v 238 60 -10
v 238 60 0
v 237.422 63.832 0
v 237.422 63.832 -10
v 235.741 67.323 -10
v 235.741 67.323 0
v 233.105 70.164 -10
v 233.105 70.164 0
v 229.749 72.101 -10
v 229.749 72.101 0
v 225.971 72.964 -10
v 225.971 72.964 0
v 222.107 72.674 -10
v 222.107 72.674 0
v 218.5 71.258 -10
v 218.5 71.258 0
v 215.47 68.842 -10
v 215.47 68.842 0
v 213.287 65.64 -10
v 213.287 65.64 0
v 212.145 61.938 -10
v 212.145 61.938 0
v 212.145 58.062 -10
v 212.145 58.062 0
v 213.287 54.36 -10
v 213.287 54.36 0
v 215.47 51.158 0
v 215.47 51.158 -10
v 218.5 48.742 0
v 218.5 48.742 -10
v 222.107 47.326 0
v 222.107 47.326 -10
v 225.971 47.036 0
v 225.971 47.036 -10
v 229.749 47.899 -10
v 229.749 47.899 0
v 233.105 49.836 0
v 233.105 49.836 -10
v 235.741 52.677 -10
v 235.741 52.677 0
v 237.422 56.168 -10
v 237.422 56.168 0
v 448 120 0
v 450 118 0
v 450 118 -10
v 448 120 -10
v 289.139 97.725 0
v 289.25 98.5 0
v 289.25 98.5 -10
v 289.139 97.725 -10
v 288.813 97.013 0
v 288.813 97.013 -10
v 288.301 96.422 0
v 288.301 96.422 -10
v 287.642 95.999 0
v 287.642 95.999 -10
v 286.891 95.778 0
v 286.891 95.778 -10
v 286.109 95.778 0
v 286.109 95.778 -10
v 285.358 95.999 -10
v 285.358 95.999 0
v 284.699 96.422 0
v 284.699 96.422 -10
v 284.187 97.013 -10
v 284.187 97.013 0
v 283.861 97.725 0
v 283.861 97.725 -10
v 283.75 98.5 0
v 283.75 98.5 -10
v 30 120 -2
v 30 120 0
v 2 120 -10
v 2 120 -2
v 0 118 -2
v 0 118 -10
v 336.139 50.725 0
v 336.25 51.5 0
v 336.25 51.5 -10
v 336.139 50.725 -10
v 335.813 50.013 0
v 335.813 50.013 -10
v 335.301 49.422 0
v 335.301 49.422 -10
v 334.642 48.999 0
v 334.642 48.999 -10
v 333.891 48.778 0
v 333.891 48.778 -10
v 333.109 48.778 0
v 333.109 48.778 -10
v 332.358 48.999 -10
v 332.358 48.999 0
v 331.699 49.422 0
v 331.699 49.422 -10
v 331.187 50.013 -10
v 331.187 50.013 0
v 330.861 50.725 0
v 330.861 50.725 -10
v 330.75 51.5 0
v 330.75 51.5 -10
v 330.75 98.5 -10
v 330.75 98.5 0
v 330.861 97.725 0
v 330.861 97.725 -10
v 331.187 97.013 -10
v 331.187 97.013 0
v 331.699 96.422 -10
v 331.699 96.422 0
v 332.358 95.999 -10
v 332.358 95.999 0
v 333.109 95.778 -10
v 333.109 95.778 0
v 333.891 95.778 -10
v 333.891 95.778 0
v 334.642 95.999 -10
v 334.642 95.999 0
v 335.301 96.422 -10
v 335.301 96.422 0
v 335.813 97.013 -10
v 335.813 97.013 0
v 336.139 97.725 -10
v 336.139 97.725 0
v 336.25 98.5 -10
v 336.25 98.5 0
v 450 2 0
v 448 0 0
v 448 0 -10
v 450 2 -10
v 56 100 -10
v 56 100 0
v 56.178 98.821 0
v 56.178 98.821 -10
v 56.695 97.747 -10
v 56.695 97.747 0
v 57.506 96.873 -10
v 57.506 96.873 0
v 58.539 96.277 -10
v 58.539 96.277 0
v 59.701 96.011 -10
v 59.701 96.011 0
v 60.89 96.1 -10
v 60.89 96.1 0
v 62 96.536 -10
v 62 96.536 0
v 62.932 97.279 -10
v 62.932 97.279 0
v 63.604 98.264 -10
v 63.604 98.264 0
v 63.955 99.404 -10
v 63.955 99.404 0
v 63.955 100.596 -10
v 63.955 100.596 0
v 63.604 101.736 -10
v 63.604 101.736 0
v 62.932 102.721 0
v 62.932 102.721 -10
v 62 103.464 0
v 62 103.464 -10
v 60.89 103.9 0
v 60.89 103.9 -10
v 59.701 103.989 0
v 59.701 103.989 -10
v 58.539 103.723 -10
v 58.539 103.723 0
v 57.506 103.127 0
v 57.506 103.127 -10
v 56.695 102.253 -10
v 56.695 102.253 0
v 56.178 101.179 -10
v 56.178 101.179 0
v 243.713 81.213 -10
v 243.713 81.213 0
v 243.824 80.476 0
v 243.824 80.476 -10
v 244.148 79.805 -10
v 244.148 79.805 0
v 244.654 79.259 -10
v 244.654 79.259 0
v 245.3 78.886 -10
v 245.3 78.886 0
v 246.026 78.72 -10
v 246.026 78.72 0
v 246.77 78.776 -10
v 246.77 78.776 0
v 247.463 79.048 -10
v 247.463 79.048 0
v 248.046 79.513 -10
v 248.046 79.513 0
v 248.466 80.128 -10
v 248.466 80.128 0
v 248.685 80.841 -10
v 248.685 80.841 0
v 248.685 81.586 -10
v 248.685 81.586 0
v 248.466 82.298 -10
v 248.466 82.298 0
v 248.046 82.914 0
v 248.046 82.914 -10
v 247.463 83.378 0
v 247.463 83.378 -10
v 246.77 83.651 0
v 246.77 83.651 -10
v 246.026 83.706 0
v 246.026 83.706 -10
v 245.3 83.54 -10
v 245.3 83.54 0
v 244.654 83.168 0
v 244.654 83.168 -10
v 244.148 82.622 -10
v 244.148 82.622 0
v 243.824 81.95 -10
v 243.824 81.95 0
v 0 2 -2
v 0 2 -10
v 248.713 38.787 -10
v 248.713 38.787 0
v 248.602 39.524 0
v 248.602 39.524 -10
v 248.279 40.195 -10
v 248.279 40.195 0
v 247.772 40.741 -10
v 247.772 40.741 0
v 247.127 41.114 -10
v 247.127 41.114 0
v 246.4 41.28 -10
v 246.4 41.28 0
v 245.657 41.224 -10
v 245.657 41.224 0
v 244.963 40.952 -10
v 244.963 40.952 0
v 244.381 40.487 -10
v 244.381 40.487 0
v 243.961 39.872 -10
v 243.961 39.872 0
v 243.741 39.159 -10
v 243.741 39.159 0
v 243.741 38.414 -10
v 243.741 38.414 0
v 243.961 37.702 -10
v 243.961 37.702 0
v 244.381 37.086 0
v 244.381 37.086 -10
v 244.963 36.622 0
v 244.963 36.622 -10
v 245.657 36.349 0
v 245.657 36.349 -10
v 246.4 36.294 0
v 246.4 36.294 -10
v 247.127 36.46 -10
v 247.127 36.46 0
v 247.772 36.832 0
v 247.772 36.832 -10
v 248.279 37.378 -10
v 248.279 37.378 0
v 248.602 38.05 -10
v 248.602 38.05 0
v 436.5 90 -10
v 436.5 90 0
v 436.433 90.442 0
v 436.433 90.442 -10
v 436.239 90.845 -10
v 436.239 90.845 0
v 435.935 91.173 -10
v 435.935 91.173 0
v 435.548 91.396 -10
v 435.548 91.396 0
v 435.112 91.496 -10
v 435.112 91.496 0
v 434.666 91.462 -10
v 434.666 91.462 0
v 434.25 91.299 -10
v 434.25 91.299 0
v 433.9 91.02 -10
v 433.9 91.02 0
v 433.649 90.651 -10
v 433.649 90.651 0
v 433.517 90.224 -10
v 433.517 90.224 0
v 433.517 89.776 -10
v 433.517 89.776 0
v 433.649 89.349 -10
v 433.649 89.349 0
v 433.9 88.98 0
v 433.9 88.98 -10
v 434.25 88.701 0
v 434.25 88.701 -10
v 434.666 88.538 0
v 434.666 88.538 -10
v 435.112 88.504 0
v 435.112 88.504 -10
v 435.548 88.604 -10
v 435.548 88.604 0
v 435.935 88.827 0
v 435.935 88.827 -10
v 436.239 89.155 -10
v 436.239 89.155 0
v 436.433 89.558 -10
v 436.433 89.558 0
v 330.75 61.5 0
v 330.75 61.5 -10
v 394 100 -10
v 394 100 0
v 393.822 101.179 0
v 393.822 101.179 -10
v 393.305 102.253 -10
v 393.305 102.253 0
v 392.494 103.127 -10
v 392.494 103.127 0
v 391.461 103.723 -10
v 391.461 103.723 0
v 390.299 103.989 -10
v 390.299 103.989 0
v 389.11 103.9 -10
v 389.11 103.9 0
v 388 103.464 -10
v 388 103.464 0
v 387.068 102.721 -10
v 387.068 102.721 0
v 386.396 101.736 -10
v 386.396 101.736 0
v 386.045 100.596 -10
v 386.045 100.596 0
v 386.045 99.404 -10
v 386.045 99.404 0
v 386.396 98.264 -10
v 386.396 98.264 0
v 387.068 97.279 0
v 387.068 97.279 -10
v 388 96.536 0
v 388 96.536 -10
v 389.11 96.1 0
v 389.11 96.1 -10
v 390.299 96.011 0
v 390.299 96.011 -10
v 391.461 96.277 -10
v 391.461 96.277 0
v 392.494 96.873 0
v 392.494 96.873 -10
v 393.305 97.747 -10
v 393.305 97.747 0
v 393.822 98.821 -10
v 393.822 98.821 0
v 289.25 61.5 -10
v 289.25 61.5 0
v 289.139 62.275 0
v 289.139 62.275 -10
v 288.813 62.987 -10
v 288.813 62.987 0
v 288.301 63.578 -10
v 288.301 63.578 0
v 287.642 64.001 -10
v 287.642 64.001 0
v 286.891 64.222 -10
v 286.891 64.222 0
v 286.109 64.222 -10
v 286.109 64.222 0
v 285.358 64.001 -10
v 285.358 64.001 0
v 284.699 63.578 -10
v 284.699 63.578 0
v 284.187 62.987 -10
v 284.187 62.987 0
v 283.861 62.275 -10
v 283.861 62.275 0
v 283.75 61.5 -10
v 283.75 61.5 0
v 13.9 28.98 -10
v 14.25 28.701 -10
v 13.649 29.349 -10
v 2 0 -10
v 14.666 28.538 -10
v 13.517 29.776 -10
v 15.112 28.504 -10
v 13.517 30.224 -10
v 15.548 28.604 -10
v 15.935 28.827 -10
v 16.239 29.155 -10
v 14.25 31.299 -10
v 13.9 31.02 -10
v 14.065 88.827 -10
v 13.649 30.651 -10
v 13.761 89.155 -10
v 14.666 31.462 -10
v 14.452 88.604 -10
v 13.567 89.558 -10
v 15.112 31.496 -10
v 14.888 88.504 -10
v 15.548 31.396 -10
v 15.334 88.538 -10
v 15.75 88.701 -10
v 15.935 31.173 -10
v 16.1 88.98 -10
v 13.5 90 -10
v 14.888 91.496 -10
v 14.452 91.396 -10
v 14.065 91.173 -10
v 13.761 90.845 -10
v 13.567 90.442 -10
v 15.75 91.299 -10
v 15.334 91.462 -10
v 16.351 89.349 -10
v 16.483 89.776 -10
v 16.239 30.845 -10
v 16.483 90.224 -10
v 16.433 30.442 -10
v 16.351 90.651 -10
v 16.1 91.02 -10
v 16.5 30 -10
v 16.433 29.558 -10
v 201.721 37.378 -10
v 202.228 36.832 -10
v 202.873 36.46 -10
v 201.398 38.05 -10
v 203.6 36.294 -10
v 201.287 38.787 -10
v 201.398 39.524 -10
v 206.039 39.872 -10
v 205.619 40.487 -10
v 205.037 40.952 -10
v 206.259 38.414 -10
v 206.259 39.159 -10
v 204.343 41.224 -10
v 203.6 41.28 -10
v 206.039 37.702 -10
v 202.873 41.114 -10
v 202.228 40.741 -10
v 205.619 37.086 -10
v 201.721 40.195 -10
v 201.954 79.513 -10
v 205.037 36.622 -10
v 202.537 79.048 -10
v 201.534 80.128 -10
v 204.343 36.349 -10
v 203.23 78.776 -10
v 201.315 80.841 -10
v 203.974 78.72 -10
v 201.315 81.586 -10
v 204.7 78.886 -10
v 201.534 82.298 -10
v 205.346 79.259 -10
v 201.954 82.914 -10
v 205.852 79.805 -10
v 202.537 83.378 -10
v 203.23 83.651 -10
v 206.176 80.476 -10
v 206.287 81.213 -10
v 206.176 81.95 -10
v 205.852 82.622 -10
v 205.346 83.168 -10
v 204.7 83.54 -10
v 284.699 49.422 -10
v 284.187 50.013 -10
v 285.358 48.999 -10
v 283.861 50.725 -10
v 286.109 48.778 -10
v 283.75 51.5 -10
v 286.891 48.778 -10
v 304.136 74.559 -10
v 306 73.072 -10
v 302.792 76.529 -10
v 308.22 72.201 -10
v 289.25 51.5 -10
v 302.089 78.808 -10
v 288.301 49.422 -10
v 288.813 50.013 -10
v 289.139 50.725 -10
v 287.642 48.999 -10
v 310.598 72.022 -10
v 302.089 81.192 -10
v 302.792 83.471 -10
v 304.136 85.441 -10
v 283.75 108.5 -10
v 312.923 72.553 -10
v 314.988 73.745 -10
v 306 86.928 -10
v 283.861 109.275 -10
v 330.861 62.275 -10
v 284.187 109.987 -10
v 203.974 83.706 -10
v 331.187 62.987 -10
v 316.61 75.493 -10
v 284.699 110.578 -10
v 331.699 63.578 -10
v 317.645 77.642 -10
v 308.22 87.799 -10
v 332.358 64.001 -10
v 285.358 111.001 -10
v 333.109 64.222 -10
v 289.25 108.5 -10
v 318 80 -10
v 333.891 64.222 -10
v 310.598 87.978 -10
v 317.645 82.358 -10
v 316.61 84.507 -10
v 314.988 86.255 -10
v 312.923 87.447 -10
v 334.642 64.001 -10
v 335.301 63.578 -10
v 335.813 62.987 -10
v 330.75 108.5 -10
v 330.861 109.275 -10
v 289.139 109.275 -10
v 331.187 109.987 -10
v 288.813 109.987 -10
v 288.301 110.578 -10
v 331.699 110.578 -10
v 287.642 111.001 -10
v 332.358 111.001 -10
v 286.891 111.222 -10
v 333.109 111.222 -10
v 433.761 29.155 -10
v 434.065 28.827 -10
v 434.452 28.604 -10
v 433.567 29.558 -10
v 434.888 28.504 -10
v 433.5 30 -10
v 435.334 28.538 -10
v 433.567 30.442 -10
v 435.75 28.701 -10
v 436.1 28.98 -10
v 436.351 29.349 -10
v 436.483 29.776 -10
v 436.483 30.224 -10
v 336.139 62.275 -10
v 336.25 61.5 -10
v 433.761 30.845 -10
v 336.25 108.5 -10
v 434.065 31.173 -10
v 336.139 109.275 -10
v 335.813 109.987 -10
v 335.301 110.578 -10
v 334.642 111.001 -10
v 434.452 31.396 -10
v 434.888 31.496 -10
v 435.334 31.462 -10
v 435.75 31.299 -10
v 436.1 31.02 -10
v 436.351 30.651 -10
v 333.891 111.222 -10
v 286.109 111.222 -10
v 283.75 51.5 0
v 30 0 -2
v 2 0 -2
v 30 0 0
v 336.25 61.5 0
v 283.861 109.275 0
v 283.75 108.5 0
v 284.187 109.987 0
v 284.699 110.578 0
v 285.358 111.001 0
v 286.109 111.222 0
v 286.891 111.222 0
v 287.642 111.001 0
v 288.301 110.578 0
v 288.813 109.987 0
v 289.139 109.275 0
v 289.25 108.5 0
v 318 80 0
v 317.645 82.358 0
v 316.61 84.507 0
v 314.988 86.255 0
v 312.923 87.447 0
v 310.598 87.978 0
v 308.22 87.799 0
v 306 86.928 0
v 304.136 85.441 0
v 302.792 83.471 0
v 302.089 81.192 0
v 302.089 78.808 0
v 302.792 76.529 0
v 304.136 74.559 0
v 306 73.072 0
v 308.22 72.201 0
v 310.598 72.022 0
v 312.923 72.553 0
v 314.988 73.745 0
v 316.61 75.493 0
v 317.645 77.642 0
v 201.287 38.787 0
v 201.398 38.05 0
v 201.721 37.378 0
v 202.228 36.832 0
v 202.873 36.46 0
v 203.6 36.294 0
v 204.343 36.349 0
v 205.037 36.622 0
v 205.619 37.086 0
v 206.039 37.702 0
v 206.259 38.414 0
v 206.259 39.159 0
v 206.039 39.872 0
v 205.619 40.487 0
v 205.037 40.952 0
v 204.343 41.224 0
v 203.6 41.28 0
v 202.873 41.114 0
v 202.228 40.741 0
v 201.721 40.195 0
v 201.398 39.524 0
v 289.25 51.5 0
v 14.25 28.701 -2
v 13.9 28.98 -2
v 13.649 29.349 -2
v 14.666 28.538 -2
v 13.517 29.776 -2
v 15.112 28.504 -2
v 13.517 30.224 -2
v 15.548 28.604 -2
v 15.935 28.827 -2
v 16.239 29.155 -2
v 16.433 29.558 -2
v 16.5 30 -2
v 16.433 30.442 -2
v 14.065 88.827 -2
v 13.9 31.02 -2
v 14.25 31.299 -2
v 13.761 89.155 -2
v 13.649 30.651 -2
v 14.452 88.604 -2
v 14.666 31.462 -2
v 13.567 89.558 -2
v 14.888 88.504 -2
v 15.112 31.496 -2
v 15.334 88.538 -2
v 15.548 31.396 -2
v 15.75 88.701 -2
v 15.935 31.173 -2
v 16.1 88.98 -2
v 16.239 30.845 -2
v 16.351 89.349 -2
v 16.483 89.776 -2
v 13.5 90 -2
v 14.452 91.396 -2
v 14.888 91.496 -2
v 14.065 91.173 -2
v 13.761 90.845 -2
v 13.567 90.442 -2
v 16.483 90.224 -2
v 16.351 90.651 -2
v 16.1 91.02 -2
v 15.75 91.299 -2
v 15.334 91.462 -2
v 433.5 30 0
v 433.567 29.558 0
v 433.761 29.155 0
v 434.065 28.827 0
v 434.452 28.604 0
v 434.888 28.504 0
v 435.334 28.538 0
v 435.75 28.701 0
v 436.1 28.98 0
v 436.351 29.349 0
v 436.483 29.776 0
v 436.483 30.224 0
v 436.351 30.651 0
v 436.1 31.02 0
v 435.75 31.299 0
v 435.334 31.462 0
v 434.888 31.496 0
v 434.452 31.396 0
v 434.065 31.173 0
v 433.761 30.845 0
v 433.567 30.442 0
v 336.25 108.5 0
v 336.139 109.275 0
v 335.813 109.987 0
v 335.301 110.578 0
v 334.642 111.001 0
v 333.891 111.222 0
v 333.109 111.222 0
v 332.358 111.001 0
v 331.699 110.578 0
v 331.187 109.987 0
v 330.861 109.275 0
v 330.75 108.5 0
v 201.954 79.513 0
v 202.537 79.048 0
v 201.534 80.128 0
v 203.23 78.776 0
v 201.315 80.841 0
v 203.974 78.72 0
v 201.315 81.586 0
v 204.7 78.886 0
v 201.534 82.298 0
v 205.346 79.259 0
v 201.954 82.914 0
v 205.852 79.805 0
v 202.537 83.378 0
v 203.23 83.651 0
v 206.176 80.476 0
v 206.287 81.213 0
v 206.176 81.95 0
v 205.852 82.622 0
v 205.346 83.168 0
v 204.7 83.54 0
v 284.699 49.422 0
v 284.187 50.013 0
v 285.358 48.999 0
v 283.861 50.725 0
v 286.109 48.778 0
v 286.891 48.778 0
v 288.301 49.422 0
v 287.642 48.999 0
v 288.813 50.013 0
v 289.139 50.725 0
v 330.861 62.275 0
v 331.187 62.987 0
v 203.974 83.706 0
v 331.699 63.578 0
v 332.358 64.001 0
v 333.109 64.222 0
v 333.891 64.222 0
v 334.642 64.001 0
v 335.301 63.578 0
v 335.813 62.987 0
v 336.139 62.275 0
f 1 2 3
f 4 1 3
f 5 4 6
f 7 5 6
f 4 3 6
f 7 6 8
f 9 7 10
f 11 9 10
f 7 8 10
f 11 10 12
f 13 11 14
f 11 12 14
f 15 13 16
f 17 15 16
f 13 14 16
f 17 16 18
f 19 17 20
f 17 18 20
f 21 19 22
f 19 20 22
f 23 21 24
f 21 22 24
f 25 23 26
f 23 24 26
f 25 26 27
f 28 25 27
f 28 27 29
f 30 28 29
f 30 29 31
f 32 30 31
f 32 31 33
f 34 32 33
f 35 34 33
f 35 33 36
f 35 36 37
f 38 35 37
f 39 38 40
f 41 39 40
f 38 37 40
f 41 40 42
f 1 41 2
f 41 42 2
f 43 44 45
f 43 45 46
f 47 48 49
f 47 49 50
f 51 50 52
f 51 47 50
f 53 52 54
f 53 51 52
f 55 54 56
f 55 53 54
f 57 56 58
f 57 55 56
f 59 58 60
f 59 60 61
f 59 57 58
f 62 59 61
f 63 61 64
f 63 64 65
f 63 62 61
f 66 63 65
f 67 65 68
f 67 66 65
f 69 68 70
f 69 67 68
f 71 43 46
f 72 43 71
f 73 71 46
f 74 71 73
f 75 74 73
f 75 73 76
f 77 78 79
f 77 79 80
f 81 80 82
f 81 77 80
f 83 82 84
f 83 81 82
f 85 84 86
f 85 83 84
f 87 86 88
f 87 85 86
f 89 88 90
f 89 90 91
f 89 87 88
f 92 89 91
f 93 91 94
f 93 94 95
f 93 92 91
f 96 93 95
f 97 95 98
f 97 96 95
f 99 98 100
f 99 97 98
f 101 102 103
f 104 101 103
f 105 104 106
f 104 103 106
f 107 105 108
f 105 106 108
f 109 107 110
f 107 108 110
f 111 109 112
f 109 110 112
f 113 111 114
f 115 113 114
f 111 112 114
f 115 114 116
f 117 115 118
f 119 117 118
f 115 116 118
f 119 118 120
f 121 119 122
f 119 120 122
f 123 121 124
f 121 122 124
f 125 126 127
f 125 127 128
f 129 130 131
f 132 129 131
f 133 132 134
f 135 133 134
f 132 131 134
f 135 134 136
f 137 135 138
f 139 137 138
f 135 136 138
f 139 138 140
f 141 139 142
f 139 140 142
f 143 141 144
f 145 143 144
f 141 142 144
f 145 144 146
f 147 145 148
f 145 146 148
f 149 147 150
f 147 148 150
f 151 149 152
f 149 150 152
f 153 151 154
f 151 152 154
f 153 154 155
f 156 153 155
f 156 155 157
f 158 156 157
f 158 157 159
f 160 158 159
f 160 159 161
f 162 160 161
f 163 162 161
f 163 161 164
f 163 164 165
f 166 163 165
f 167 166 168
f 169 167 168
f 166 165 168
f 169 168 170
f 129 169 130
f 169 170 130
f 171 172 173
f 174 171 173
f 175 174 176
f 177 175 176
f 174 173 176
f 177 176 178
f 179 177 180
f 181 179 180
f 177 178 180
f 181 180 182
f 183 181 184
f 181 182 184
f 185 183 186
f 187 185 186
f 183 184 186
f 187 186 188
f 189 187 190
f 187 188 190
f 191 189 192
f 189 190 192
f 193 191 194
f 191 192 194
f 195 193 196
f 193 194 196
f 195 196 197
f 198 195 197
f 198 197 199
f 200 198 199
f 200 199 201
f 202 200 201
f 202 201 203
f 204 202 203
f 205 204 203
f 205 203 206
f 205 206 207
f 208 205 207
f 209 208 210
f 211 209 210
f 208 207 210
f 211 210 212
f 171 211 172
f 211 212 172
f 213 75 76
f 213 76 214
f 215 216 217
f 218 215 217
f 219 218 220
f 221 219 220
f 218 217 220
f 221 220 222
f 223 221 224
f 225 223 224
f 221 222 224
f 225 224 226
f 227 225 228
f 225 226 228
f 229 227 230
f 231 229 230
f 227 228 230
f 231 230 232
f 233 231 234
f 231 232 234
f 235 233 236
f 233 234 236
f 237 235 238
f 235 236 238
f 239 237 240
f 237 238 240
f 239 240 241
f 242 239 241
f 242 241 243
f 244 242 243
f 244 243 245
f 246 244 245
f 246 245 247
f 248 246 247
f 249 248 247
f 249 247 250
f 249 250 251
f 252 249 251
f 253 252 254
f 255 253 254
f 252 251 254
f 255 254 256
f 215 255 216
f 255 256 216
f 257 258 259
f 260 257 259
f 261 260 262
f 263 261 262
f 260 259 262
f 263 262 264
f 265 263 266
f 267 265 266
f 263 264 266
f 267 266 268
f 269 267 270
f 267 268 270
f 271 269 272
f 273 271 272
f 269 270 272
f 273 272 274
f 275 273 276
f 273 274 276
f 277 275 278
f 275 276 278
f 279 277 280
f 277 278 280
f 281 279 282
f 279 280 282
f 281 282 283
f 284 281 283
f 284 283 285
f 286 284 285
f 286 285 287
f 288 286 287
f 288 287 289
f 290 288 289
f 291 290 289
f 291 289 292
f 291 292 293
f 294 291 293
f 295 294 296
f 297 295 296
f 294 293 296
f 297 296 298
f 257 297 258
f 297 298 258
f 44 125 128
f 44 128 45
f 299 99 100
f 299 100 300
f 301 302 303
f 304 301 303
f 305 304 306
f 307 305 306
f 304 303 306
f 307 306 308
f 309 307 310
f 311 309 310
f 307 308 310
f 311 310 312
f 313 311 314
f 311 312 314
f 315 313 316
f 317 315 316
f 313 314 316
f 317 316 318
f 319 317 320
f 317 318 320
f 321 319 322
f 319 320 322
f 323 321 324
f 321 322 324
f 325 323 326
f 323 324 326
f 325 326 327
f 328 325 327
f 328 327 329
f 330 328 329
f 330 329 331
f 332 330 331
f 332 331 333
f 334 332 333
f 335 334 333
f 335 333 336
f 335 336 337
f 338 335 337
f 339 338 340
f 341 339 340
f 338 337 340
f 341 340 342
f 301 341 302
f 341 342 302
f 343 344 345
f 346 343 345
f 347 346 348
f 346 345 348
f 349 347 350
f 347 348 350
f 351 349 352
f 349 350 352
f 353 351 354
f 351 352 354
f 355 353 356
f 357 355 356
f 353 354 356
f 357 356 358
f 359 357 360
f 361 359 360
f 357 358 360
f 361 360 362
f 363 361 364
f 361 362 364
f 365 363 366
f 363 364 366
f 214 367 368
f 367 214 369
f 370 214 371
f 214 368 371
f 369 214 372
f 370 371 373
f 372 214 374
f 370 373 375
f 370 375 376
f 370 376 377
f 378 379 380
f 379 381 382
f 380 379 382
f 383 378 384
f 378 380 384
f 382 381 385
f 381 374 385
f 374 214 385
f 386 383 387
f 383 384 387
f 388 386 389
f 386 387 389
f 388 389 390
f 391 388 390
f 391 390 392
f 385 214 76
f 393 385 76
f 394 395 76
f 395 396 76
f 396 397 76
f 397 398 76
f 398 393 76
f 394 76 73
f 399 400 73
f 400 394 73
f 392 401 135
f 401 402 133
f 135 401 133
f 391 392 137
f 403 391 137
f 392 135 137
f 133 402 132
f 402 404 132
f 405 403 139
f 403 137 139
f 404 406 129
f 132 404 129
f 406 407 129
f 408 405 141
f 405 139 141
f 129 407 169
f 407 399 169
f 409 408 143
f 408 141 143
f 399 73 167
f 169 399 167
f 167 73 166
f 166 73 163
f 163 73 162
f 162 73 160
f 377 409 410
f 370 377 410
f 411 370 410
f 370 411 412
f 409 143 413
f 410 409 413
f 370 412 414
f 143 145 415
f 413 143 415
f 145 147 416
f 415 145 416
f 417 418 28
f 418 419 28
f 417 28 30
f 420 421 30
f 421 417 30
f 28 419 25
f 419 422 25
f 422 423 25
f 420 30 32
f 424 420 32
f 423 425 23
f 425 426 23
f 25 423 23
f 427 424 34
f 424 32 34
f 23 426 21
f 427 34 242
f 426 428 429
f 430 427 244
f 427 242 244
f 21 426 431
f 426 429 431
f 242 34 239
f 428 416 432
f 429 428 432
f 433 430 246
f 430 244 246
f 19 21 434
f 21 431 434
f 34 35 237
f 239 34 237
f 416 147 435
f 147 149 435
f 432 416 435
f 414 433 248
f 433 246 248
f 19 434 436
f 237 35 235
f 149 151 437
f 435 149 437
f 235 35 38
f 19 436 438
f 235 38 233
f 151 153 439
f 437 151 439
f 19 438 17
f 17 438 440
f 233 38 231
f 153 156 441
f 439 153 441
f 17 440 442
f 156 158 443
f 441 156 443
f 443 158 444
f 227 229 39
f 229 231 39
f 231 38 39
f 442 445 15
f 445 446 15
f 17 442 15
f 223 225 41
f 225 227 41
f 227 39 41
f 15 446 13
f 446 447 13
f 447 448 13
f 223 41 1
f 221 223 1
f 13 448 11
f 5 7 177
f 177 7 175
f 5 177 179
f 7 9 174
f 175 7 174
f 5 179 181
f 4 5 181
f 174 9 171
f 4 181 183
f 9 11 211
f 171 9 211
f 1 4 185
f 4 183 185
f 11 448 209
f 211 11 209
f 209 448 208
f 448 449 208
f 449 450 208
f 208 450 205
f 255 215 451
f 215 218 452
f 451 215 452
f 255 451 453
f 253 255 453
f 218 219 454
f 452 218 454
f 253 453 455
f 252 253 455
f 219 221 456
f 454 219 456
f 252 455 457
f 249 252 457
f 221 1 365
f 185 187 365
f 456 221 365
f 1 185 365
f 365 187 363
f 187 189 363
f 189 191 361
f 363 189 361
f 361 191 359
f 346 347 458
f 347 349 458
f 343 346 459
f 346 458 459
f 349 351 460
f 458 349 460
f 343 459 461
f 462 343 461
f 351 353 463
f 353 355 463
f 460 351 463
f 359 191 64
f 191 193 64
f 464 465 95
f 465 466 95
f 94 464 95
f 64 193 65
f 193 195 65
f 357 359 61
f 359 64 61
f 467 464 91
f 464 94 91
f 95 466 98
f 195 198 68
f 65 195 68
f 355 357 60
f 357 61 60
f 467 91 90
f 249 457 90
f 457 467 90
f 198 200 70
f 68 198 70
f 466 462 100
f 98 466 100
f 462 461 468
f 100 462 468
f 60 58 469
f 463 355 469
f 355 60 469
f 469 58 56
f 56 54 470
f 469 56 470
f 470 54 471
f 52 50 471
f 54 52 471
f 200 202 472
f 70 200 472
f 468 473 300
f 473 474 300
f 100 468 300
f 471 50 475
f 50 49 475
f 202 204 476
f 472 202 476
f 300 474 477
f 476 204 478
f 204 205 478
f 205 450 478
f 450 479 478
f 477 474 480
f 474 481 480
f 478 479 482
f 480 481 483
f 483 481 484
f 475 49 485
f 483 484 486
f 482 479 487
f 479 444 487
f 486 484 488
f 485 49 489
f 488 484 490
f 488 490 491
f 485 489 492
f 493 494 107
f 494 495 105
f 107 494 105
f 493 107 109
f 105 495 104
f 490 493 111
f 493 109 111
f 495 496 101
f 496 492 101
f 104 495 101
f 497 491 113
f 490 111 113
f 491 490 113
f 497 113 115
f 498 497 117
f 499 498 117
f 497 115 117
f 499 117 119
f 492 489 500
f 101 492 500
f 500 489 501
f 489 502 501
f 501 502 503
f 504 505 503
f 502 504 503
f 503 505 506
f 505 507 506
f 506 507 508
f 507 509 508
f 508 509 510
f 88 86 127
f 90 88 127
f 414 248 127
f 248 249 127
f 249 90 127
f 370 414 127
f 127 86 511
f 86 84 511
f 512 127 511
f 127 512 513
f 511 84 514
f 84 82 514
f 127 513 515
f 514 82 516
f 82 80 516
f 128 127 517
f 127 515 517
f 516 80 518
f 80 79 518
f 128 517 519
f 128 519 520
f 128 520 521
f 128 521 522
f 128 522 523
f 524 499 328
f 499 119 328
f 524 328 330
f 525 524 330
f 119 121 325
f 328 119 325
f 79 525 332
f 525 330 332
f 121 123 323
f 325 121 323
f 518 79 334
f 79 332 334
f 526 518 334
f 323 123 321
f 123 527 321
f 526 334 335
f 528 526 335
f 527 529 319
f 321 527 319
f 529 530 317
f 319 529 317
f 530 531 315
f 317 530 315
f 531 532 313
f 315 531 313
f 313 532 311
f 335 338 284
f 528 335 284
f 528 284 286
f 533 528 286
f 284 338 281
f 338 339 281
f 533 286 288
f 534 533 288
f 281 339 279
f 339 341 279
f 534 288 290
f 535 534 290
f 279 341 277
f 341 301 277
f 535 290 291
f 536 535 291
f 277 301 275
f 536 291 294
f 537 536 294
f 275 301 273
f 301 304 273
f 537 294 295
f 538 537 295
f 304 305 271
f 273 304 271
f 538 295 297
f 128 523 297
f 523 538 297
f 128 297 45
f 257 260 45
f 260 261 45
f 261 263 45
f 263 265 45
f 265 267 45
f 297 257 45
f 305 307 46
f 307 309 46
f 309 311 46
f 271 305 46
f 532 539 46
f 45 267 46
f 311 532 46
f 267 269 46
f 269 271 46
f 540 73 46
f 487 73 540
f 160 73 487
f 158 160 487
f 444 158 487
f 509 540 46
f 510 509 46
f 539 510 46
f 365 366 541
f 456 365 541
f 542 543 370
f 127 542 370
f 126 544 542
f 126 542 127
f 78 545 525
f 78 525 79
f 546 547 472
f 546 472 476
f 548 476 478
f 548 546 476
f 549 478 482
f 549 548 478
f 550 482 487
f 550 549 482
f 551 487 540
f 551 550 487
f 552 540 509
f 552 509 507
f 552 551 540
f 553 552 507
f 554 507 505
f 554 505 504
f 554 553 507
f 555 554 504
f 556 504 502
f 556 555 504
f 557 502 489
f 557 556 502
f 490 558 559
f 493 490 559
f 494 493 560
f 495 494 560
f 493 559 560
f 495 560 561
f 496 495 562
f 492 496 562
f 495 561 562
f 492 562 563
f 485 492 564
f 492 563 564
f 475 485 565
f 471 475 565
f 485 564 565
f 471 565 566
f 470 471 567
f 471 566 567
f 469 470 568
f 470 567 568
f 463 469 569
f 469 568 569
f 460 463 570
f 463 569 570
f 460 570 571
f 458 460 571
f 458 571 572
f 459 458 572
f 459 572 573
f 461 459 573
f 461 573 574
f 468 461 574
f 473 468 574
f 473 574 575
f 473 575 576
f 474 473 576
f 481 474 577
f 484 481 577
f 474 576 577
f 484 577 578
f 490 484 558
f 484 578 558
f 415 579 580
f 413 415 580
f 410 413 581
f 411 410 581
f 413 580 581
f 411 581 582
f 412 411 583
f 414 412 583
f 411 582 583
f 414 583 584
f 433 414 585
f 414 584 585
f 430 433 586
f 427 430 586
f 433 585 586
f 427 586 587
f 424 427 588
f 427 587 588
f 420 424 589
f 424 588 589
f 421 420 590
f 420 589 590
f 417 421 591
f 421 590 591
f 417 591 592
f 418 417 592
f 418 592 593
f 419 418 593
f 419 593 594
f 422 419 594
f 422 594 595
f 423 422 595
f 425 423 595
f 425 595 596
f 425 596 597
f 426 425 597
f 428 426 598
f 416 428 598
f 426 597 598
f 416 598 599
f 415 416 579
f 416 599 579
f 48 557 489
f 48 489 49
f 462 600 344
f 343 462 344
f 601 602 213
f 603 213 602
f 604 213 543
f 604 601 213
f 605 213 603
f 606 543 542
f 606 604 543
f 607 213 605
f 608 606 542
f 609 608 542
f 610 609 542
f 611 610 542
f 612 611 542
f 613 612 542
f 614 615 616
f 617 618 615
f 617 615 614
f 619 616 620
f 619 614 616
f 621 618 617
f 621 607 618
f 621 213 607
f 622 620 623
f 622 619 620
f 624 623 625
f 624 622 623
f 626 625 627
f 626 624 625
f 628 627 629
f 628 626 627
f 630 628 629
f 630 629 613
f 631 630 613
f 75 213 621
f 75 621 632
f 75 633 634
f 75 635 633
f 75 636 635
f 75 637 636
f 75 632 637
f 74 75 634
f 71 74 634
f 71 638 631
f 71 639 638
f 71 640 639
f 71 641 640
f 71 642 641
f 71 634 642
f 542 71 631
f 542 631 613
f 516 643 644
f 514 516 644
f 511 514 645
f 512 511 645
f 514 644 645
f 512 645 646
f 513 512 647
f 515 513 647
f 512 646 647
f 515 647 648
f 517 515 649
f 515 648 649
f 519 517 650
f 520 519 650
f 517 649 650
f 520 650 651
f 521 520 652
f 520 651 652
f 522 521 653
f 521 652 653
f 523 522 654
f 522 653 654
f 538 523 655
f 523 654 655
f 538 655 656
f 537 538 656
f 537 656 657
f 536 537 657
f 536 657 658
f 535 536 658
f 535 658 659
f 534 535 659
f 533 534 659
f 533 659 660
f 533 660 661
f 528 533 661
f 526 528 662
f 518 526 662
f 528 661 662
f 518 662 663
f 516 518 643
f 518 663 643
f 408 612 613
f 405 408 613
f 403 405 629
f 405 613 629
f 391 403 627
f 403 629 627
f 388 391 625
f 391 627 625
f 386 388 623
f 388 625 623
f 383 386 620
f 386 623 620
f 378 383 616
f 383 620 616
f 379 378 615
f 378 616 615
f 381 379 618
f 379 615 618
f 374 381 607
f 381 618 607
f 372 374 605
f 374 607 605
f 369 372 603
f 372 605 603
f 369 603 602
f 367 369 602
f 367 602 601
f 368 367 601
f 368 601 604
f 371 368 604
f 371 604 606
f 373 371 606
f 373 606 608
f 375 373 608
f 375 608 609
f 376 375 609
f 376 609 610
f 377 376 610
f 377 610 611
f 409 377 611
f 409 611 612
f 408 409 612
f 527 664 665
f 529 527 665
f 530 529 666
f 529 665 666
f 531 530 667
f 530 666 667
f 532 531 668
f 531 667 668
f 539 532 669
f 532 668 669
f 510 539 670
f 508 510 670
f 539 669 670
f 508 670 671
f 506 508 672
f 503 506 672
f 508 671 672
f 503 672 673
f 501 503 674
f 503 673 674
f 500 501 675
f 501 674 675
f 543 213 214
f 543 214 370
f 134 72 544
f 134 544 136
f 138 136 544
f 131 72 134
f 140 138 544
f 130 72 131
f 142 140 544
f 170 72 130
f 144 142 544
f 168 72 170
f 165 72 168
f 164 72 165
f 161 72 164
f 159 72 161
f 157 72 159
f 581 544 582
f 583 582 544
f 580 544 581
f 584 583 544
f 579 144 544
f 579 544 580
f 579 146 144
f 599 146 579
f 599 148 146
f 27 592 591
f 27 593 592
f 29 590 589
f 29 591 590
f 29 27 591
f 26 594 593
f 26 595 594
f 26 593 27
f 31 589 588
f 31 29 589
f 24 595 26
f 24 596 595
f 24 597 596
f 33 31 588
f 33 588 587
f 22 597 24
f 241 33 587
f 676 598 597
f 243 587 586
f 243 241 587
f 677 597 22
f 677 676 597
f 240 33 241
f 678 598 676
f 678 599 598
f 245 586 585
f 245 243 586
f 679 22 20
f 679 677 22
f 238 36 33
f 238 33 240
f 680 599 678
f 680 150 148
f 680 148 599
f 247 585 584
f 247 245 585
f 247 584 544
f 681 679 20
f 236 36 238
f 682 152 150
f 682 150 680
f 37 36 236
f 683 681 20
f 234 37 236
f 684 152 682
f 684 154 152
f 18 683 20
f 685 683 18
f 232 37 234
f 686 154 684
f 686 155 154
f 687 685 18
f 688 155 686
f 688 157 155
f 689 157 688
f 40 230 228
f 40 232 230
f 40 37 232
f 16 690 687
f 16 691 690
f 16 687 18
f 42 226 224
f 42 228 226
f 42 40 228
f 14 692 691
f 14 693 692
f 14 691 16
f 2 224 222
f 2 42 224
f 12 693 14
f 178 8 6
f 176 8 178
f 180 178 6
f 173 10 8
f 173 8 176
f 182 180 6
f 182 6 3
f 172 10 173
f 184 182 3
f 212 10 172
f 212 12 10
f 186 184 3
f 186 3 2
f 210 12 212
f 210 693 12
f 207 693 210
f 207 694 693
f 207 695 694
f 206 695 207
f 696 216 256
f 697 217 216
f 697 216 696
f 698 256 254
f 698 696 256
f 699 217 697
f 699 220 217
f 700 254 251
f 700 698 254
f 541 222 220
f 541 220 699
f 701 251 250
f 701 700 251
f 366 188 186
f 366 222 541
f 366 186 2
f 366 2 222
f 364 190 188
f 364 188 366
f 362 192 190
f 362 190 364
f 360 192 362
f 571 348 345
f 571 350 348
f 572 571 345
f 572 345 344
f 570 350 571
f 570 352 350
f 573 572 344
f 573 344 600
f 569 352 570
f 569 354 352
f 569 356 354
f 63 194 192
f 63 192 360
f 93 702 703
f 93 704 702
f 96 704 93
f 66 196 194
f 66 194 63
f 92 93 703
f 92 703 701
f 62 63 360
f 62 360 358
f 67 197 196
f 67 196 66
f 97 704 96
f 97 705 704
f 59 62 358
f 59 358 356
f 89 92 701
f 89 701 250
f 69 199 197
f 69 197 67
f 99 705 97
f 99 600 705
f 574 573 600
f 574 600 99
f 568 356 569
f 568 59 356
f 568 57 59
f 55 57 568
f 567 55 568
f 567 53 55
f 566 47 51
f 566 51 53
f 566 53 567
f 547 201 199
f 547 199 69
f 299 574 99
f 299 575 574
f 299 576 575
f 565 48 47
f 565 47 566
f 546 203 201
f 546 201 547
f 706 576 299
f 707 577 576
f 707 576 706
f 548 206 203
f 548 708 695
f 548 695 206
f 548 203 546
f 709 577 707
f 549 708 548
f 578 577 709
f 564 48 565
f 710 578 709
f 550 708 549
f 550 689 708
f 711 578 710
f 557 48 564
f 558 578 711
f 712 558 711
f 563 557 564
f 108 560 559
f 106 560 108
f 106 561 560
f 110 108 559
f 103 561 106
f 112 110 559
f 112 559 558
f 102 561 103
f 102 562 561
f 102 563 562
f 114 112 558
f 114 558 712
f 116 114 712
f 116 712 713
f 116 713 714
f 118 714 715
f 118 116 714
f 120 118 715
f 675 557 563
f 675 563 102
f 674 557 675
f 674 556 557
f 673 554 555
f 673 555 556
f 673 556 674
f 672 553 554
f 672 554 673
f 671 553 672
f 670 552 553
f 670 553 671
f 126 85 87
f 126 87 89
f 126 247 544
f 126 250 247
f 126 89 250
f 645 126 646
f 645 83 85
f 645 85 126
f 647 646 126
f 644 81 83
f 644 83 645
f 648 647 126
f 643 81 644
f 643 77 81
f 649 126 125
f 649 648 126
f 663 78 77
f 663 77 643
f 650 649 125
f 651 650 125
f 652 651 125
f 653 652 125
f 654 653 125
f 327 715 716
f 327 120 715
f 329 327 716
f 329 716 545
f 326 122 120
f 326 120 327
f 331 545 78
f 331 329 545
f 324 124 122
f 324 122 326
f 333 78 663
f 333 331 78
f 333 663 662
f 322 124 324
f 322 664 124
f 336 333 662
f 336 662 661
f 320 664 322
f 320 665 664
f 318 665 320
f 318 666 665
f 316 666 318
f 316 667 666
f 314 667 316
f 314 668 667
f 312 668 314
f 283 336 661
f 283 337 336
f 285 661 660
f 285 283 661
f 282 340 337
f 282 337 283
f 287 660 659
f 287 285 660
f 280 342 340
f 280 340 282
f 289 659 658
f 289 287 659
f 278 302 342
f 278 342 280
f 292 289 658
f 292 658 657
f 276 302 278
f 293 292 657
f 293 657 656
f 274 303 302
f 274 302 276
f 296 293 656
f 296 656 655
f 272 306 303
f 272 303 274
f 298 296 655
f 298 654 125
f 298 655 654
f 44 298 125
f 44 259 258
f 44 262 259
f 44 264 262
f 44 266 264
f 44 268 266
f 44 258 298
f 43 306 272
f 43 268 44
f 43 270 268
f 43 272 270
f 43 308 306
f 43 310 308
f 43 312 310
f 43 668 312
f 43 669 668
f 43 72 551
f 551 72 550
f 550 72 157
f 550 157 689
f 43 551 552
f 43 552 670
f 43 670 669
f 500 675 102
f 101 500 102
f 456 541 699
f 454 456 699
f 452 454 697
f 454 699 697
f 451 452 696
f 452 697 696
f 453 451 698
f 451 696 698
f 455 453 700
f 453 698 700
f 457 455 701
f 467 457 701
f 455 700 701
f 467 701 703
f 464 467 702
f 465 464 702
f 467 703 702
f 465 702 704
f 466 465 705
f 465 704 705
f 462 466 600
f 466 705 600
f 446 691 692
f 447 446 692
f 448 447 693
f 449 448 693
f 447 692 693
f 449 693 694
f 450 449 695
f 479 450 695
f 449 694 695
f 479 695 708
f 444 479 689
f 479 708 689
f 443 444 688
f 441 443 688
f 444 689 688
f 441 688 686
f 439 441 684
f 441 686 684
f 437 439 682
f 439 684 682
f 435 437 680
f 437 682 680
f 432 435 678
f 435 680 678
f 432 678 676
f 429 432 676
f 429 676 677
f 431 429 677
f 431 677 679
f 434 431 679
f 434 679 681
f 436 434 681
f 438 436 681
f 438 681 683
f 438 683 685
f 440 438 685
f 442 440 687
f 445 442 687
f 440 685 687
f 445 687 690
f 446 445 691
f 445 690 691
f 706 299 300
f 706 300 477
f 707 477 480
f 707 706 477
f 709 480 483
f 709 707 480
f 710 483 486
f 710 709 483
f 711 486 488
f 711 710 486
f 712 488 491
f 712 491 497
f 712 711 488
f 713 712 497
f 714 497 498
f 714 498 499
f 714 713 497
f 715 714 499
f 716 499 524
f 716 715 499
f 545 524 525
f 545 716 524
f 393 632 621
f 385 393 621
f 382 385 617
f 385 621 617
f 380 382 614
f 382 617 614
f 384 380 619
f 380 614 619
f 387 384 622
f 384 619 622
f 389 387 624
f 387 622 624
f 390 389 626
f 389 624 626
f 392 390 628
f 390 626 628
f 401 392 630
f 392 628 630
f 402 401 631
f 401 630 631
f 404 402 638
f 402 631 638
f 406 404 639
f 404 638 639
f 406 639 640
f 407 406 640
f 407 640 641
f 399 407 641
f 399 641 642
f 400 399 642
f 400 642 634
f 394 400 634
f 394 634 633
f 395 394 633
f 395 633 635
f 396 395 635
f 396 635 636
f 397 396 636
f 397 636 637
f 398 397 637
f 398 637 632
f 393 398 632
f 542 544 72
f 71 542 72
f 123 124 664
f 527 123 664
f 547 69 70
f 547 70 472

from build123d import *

# Parameters (mm, degrees)
SCHIZZO1_R                   = 13
SCHIZZO1_R_2                 = 2.5
SCHIZZO1_R_3                 = 4
SCHIZZO1_R_4                 = 1.5
SCHIZZO1_R_5                 = 8
ESTRUSIONE_ESTRUSIONE1_DEPTH = 10
SCHIZZO2_W                   = 30
SCHIZZO2_H                   = 120
TAGLIO_ESTRUSIONE1_DEPTH     = 2


with BuildPart() as part:
    # Schizzo1 → Estrusione-Estrusione1 (new body)
    with BuildSketch(Plane.XY):
        Polygon((2, 0), (448, 0), (450, 2), (450, 118), (448, 120), (2, 120), (0, 118), (0, 2), align=None)
        with Locations((225, 60)):
            Circle(SCHIZZO1_R, mode=Mode.SUBTRACT)
        with Locations(Location((246.213203436, 81.213203436, 0), (0, 0, 180))):
            Circle(SCHIZZO1_R_2, mode=Mode.SUBTRACT)
        with Locations((390, 100)):
            Circle(SCHIZZO1_R_3, mode=Mode.SUBTRACT)
        with Locations((246.213203436, 38.786796564)):
            Circle(SCHIZZO1_R_2, mode=Mode.SUBTRACT)
        with Locations(Location((203.786796564, 38.786796564, 0), (0, 0, 180))):
            Circle(SCHIZZO1_R_2, mode=Mode.SUBTRACT)
        with Locations(Location((60, 100, 0), (0, 0, 180))):
            Circle(SCHIZZO1_R_3, mode=Mode.SUBTRACT)
        with Locations((15, 30)):
            Circle(SCHIZZO1_R_4, mode=Mode.SUBTRACT)
        with Locations(Location((435, 30, 0), (0, 0, 180))):
            Circle(SCHIZZO1_R_4, mode=Mode.SUBTRACT)
        with Locations((203.786796564, 81.213203436)):
            Circle(SCHIZZO1_R_2, mode=Mode.SUBTRACT)
        with Locations((435, 90)):
            Circle(SCHIZZO1_R_4, mode=Mode.SUBTRACT)
        with Locations(Location((15, 90, 0), (0, 0, 180))):
            Circle(SCHIZZO1_R_4, mode=Mode.SUBTRACT)
        with Locations((310, 80)):
            Circle(SCHIZZO1_R_5, mode=Mode.SUBTRACT)
        with BuildLine():
            Line((330.75, 108.5), (330.75, 98.5))
            ThreePointArc((330.75, 98.5), (333.5, 95.75), (336.25, 98.5))
            Line((336.25, 98.5), (336.25, 108.5))
            ThreePointArc((336.25, 108.5), (333.5, 111.25), (330.75, 108.5))
        make_face(mode=Mode.SUBTRACT)
        with BuildLine():
            Line((289.25, 108.5), (289.25, 98.5))
            ThreePointArc((289.25, 98.5), (286.5, 95.75), (283.75, 98.5))
            Line((283.75, 98.5), (283.75, 108.5))
            ThreePointArc((283.75, 108.5), (286.5, 111.25), (289.25, 108.5))
        make_face(mode=Mode.SUBTRACT)
        with BuildLine():
            Line((330.75, 51.5), (330.75, 61.5))
            ThreePointArc((330.75, 61.5), (333.5, 64.25), (336.25, 61.5))
            Line((336.25, 61.5), (336.25, 51.5))
            ThreePointArc((336.25, 51.5), (333.5, 48.75), (330.75, 51.5))
        make_face(mode=Mode.SUBTRACT)
        with BuildLine():
            Line((289.25, 51.5), (289.25, 61.5))
            ThreePointArc((289.25, 61.5), (286.5, 64.25), (283.75, 61.5))
            Line((283.75, 61.5), (283.75, 51.5))
            ThreePointArc((283.75, 51.5), (286.5, 48.75), (289.25, 51.5))
        make_face(mode=Mode.SUBTRACT)
    extrude(amount=-ESTRUSIONE_ESTRUSIONE1_DEPTH)

    # Schizzo2 → Taglio-Estrusione1 (cut)
    with BuildSketch(Plane.XY):
        with Locations((15, 60)):
            Rectangle(SCHIZZO2_W, SCHIZZO2_H)
        with Locations((615.438855383, 60)):
            Rectangle(SCHIZZO2_W, SCHIZZO2_H)
    extrude(amount=-TAGLIO_ESTRUSIONE1_DEPTH, mode=Mode.SUBTRACT)


solid = part.part
